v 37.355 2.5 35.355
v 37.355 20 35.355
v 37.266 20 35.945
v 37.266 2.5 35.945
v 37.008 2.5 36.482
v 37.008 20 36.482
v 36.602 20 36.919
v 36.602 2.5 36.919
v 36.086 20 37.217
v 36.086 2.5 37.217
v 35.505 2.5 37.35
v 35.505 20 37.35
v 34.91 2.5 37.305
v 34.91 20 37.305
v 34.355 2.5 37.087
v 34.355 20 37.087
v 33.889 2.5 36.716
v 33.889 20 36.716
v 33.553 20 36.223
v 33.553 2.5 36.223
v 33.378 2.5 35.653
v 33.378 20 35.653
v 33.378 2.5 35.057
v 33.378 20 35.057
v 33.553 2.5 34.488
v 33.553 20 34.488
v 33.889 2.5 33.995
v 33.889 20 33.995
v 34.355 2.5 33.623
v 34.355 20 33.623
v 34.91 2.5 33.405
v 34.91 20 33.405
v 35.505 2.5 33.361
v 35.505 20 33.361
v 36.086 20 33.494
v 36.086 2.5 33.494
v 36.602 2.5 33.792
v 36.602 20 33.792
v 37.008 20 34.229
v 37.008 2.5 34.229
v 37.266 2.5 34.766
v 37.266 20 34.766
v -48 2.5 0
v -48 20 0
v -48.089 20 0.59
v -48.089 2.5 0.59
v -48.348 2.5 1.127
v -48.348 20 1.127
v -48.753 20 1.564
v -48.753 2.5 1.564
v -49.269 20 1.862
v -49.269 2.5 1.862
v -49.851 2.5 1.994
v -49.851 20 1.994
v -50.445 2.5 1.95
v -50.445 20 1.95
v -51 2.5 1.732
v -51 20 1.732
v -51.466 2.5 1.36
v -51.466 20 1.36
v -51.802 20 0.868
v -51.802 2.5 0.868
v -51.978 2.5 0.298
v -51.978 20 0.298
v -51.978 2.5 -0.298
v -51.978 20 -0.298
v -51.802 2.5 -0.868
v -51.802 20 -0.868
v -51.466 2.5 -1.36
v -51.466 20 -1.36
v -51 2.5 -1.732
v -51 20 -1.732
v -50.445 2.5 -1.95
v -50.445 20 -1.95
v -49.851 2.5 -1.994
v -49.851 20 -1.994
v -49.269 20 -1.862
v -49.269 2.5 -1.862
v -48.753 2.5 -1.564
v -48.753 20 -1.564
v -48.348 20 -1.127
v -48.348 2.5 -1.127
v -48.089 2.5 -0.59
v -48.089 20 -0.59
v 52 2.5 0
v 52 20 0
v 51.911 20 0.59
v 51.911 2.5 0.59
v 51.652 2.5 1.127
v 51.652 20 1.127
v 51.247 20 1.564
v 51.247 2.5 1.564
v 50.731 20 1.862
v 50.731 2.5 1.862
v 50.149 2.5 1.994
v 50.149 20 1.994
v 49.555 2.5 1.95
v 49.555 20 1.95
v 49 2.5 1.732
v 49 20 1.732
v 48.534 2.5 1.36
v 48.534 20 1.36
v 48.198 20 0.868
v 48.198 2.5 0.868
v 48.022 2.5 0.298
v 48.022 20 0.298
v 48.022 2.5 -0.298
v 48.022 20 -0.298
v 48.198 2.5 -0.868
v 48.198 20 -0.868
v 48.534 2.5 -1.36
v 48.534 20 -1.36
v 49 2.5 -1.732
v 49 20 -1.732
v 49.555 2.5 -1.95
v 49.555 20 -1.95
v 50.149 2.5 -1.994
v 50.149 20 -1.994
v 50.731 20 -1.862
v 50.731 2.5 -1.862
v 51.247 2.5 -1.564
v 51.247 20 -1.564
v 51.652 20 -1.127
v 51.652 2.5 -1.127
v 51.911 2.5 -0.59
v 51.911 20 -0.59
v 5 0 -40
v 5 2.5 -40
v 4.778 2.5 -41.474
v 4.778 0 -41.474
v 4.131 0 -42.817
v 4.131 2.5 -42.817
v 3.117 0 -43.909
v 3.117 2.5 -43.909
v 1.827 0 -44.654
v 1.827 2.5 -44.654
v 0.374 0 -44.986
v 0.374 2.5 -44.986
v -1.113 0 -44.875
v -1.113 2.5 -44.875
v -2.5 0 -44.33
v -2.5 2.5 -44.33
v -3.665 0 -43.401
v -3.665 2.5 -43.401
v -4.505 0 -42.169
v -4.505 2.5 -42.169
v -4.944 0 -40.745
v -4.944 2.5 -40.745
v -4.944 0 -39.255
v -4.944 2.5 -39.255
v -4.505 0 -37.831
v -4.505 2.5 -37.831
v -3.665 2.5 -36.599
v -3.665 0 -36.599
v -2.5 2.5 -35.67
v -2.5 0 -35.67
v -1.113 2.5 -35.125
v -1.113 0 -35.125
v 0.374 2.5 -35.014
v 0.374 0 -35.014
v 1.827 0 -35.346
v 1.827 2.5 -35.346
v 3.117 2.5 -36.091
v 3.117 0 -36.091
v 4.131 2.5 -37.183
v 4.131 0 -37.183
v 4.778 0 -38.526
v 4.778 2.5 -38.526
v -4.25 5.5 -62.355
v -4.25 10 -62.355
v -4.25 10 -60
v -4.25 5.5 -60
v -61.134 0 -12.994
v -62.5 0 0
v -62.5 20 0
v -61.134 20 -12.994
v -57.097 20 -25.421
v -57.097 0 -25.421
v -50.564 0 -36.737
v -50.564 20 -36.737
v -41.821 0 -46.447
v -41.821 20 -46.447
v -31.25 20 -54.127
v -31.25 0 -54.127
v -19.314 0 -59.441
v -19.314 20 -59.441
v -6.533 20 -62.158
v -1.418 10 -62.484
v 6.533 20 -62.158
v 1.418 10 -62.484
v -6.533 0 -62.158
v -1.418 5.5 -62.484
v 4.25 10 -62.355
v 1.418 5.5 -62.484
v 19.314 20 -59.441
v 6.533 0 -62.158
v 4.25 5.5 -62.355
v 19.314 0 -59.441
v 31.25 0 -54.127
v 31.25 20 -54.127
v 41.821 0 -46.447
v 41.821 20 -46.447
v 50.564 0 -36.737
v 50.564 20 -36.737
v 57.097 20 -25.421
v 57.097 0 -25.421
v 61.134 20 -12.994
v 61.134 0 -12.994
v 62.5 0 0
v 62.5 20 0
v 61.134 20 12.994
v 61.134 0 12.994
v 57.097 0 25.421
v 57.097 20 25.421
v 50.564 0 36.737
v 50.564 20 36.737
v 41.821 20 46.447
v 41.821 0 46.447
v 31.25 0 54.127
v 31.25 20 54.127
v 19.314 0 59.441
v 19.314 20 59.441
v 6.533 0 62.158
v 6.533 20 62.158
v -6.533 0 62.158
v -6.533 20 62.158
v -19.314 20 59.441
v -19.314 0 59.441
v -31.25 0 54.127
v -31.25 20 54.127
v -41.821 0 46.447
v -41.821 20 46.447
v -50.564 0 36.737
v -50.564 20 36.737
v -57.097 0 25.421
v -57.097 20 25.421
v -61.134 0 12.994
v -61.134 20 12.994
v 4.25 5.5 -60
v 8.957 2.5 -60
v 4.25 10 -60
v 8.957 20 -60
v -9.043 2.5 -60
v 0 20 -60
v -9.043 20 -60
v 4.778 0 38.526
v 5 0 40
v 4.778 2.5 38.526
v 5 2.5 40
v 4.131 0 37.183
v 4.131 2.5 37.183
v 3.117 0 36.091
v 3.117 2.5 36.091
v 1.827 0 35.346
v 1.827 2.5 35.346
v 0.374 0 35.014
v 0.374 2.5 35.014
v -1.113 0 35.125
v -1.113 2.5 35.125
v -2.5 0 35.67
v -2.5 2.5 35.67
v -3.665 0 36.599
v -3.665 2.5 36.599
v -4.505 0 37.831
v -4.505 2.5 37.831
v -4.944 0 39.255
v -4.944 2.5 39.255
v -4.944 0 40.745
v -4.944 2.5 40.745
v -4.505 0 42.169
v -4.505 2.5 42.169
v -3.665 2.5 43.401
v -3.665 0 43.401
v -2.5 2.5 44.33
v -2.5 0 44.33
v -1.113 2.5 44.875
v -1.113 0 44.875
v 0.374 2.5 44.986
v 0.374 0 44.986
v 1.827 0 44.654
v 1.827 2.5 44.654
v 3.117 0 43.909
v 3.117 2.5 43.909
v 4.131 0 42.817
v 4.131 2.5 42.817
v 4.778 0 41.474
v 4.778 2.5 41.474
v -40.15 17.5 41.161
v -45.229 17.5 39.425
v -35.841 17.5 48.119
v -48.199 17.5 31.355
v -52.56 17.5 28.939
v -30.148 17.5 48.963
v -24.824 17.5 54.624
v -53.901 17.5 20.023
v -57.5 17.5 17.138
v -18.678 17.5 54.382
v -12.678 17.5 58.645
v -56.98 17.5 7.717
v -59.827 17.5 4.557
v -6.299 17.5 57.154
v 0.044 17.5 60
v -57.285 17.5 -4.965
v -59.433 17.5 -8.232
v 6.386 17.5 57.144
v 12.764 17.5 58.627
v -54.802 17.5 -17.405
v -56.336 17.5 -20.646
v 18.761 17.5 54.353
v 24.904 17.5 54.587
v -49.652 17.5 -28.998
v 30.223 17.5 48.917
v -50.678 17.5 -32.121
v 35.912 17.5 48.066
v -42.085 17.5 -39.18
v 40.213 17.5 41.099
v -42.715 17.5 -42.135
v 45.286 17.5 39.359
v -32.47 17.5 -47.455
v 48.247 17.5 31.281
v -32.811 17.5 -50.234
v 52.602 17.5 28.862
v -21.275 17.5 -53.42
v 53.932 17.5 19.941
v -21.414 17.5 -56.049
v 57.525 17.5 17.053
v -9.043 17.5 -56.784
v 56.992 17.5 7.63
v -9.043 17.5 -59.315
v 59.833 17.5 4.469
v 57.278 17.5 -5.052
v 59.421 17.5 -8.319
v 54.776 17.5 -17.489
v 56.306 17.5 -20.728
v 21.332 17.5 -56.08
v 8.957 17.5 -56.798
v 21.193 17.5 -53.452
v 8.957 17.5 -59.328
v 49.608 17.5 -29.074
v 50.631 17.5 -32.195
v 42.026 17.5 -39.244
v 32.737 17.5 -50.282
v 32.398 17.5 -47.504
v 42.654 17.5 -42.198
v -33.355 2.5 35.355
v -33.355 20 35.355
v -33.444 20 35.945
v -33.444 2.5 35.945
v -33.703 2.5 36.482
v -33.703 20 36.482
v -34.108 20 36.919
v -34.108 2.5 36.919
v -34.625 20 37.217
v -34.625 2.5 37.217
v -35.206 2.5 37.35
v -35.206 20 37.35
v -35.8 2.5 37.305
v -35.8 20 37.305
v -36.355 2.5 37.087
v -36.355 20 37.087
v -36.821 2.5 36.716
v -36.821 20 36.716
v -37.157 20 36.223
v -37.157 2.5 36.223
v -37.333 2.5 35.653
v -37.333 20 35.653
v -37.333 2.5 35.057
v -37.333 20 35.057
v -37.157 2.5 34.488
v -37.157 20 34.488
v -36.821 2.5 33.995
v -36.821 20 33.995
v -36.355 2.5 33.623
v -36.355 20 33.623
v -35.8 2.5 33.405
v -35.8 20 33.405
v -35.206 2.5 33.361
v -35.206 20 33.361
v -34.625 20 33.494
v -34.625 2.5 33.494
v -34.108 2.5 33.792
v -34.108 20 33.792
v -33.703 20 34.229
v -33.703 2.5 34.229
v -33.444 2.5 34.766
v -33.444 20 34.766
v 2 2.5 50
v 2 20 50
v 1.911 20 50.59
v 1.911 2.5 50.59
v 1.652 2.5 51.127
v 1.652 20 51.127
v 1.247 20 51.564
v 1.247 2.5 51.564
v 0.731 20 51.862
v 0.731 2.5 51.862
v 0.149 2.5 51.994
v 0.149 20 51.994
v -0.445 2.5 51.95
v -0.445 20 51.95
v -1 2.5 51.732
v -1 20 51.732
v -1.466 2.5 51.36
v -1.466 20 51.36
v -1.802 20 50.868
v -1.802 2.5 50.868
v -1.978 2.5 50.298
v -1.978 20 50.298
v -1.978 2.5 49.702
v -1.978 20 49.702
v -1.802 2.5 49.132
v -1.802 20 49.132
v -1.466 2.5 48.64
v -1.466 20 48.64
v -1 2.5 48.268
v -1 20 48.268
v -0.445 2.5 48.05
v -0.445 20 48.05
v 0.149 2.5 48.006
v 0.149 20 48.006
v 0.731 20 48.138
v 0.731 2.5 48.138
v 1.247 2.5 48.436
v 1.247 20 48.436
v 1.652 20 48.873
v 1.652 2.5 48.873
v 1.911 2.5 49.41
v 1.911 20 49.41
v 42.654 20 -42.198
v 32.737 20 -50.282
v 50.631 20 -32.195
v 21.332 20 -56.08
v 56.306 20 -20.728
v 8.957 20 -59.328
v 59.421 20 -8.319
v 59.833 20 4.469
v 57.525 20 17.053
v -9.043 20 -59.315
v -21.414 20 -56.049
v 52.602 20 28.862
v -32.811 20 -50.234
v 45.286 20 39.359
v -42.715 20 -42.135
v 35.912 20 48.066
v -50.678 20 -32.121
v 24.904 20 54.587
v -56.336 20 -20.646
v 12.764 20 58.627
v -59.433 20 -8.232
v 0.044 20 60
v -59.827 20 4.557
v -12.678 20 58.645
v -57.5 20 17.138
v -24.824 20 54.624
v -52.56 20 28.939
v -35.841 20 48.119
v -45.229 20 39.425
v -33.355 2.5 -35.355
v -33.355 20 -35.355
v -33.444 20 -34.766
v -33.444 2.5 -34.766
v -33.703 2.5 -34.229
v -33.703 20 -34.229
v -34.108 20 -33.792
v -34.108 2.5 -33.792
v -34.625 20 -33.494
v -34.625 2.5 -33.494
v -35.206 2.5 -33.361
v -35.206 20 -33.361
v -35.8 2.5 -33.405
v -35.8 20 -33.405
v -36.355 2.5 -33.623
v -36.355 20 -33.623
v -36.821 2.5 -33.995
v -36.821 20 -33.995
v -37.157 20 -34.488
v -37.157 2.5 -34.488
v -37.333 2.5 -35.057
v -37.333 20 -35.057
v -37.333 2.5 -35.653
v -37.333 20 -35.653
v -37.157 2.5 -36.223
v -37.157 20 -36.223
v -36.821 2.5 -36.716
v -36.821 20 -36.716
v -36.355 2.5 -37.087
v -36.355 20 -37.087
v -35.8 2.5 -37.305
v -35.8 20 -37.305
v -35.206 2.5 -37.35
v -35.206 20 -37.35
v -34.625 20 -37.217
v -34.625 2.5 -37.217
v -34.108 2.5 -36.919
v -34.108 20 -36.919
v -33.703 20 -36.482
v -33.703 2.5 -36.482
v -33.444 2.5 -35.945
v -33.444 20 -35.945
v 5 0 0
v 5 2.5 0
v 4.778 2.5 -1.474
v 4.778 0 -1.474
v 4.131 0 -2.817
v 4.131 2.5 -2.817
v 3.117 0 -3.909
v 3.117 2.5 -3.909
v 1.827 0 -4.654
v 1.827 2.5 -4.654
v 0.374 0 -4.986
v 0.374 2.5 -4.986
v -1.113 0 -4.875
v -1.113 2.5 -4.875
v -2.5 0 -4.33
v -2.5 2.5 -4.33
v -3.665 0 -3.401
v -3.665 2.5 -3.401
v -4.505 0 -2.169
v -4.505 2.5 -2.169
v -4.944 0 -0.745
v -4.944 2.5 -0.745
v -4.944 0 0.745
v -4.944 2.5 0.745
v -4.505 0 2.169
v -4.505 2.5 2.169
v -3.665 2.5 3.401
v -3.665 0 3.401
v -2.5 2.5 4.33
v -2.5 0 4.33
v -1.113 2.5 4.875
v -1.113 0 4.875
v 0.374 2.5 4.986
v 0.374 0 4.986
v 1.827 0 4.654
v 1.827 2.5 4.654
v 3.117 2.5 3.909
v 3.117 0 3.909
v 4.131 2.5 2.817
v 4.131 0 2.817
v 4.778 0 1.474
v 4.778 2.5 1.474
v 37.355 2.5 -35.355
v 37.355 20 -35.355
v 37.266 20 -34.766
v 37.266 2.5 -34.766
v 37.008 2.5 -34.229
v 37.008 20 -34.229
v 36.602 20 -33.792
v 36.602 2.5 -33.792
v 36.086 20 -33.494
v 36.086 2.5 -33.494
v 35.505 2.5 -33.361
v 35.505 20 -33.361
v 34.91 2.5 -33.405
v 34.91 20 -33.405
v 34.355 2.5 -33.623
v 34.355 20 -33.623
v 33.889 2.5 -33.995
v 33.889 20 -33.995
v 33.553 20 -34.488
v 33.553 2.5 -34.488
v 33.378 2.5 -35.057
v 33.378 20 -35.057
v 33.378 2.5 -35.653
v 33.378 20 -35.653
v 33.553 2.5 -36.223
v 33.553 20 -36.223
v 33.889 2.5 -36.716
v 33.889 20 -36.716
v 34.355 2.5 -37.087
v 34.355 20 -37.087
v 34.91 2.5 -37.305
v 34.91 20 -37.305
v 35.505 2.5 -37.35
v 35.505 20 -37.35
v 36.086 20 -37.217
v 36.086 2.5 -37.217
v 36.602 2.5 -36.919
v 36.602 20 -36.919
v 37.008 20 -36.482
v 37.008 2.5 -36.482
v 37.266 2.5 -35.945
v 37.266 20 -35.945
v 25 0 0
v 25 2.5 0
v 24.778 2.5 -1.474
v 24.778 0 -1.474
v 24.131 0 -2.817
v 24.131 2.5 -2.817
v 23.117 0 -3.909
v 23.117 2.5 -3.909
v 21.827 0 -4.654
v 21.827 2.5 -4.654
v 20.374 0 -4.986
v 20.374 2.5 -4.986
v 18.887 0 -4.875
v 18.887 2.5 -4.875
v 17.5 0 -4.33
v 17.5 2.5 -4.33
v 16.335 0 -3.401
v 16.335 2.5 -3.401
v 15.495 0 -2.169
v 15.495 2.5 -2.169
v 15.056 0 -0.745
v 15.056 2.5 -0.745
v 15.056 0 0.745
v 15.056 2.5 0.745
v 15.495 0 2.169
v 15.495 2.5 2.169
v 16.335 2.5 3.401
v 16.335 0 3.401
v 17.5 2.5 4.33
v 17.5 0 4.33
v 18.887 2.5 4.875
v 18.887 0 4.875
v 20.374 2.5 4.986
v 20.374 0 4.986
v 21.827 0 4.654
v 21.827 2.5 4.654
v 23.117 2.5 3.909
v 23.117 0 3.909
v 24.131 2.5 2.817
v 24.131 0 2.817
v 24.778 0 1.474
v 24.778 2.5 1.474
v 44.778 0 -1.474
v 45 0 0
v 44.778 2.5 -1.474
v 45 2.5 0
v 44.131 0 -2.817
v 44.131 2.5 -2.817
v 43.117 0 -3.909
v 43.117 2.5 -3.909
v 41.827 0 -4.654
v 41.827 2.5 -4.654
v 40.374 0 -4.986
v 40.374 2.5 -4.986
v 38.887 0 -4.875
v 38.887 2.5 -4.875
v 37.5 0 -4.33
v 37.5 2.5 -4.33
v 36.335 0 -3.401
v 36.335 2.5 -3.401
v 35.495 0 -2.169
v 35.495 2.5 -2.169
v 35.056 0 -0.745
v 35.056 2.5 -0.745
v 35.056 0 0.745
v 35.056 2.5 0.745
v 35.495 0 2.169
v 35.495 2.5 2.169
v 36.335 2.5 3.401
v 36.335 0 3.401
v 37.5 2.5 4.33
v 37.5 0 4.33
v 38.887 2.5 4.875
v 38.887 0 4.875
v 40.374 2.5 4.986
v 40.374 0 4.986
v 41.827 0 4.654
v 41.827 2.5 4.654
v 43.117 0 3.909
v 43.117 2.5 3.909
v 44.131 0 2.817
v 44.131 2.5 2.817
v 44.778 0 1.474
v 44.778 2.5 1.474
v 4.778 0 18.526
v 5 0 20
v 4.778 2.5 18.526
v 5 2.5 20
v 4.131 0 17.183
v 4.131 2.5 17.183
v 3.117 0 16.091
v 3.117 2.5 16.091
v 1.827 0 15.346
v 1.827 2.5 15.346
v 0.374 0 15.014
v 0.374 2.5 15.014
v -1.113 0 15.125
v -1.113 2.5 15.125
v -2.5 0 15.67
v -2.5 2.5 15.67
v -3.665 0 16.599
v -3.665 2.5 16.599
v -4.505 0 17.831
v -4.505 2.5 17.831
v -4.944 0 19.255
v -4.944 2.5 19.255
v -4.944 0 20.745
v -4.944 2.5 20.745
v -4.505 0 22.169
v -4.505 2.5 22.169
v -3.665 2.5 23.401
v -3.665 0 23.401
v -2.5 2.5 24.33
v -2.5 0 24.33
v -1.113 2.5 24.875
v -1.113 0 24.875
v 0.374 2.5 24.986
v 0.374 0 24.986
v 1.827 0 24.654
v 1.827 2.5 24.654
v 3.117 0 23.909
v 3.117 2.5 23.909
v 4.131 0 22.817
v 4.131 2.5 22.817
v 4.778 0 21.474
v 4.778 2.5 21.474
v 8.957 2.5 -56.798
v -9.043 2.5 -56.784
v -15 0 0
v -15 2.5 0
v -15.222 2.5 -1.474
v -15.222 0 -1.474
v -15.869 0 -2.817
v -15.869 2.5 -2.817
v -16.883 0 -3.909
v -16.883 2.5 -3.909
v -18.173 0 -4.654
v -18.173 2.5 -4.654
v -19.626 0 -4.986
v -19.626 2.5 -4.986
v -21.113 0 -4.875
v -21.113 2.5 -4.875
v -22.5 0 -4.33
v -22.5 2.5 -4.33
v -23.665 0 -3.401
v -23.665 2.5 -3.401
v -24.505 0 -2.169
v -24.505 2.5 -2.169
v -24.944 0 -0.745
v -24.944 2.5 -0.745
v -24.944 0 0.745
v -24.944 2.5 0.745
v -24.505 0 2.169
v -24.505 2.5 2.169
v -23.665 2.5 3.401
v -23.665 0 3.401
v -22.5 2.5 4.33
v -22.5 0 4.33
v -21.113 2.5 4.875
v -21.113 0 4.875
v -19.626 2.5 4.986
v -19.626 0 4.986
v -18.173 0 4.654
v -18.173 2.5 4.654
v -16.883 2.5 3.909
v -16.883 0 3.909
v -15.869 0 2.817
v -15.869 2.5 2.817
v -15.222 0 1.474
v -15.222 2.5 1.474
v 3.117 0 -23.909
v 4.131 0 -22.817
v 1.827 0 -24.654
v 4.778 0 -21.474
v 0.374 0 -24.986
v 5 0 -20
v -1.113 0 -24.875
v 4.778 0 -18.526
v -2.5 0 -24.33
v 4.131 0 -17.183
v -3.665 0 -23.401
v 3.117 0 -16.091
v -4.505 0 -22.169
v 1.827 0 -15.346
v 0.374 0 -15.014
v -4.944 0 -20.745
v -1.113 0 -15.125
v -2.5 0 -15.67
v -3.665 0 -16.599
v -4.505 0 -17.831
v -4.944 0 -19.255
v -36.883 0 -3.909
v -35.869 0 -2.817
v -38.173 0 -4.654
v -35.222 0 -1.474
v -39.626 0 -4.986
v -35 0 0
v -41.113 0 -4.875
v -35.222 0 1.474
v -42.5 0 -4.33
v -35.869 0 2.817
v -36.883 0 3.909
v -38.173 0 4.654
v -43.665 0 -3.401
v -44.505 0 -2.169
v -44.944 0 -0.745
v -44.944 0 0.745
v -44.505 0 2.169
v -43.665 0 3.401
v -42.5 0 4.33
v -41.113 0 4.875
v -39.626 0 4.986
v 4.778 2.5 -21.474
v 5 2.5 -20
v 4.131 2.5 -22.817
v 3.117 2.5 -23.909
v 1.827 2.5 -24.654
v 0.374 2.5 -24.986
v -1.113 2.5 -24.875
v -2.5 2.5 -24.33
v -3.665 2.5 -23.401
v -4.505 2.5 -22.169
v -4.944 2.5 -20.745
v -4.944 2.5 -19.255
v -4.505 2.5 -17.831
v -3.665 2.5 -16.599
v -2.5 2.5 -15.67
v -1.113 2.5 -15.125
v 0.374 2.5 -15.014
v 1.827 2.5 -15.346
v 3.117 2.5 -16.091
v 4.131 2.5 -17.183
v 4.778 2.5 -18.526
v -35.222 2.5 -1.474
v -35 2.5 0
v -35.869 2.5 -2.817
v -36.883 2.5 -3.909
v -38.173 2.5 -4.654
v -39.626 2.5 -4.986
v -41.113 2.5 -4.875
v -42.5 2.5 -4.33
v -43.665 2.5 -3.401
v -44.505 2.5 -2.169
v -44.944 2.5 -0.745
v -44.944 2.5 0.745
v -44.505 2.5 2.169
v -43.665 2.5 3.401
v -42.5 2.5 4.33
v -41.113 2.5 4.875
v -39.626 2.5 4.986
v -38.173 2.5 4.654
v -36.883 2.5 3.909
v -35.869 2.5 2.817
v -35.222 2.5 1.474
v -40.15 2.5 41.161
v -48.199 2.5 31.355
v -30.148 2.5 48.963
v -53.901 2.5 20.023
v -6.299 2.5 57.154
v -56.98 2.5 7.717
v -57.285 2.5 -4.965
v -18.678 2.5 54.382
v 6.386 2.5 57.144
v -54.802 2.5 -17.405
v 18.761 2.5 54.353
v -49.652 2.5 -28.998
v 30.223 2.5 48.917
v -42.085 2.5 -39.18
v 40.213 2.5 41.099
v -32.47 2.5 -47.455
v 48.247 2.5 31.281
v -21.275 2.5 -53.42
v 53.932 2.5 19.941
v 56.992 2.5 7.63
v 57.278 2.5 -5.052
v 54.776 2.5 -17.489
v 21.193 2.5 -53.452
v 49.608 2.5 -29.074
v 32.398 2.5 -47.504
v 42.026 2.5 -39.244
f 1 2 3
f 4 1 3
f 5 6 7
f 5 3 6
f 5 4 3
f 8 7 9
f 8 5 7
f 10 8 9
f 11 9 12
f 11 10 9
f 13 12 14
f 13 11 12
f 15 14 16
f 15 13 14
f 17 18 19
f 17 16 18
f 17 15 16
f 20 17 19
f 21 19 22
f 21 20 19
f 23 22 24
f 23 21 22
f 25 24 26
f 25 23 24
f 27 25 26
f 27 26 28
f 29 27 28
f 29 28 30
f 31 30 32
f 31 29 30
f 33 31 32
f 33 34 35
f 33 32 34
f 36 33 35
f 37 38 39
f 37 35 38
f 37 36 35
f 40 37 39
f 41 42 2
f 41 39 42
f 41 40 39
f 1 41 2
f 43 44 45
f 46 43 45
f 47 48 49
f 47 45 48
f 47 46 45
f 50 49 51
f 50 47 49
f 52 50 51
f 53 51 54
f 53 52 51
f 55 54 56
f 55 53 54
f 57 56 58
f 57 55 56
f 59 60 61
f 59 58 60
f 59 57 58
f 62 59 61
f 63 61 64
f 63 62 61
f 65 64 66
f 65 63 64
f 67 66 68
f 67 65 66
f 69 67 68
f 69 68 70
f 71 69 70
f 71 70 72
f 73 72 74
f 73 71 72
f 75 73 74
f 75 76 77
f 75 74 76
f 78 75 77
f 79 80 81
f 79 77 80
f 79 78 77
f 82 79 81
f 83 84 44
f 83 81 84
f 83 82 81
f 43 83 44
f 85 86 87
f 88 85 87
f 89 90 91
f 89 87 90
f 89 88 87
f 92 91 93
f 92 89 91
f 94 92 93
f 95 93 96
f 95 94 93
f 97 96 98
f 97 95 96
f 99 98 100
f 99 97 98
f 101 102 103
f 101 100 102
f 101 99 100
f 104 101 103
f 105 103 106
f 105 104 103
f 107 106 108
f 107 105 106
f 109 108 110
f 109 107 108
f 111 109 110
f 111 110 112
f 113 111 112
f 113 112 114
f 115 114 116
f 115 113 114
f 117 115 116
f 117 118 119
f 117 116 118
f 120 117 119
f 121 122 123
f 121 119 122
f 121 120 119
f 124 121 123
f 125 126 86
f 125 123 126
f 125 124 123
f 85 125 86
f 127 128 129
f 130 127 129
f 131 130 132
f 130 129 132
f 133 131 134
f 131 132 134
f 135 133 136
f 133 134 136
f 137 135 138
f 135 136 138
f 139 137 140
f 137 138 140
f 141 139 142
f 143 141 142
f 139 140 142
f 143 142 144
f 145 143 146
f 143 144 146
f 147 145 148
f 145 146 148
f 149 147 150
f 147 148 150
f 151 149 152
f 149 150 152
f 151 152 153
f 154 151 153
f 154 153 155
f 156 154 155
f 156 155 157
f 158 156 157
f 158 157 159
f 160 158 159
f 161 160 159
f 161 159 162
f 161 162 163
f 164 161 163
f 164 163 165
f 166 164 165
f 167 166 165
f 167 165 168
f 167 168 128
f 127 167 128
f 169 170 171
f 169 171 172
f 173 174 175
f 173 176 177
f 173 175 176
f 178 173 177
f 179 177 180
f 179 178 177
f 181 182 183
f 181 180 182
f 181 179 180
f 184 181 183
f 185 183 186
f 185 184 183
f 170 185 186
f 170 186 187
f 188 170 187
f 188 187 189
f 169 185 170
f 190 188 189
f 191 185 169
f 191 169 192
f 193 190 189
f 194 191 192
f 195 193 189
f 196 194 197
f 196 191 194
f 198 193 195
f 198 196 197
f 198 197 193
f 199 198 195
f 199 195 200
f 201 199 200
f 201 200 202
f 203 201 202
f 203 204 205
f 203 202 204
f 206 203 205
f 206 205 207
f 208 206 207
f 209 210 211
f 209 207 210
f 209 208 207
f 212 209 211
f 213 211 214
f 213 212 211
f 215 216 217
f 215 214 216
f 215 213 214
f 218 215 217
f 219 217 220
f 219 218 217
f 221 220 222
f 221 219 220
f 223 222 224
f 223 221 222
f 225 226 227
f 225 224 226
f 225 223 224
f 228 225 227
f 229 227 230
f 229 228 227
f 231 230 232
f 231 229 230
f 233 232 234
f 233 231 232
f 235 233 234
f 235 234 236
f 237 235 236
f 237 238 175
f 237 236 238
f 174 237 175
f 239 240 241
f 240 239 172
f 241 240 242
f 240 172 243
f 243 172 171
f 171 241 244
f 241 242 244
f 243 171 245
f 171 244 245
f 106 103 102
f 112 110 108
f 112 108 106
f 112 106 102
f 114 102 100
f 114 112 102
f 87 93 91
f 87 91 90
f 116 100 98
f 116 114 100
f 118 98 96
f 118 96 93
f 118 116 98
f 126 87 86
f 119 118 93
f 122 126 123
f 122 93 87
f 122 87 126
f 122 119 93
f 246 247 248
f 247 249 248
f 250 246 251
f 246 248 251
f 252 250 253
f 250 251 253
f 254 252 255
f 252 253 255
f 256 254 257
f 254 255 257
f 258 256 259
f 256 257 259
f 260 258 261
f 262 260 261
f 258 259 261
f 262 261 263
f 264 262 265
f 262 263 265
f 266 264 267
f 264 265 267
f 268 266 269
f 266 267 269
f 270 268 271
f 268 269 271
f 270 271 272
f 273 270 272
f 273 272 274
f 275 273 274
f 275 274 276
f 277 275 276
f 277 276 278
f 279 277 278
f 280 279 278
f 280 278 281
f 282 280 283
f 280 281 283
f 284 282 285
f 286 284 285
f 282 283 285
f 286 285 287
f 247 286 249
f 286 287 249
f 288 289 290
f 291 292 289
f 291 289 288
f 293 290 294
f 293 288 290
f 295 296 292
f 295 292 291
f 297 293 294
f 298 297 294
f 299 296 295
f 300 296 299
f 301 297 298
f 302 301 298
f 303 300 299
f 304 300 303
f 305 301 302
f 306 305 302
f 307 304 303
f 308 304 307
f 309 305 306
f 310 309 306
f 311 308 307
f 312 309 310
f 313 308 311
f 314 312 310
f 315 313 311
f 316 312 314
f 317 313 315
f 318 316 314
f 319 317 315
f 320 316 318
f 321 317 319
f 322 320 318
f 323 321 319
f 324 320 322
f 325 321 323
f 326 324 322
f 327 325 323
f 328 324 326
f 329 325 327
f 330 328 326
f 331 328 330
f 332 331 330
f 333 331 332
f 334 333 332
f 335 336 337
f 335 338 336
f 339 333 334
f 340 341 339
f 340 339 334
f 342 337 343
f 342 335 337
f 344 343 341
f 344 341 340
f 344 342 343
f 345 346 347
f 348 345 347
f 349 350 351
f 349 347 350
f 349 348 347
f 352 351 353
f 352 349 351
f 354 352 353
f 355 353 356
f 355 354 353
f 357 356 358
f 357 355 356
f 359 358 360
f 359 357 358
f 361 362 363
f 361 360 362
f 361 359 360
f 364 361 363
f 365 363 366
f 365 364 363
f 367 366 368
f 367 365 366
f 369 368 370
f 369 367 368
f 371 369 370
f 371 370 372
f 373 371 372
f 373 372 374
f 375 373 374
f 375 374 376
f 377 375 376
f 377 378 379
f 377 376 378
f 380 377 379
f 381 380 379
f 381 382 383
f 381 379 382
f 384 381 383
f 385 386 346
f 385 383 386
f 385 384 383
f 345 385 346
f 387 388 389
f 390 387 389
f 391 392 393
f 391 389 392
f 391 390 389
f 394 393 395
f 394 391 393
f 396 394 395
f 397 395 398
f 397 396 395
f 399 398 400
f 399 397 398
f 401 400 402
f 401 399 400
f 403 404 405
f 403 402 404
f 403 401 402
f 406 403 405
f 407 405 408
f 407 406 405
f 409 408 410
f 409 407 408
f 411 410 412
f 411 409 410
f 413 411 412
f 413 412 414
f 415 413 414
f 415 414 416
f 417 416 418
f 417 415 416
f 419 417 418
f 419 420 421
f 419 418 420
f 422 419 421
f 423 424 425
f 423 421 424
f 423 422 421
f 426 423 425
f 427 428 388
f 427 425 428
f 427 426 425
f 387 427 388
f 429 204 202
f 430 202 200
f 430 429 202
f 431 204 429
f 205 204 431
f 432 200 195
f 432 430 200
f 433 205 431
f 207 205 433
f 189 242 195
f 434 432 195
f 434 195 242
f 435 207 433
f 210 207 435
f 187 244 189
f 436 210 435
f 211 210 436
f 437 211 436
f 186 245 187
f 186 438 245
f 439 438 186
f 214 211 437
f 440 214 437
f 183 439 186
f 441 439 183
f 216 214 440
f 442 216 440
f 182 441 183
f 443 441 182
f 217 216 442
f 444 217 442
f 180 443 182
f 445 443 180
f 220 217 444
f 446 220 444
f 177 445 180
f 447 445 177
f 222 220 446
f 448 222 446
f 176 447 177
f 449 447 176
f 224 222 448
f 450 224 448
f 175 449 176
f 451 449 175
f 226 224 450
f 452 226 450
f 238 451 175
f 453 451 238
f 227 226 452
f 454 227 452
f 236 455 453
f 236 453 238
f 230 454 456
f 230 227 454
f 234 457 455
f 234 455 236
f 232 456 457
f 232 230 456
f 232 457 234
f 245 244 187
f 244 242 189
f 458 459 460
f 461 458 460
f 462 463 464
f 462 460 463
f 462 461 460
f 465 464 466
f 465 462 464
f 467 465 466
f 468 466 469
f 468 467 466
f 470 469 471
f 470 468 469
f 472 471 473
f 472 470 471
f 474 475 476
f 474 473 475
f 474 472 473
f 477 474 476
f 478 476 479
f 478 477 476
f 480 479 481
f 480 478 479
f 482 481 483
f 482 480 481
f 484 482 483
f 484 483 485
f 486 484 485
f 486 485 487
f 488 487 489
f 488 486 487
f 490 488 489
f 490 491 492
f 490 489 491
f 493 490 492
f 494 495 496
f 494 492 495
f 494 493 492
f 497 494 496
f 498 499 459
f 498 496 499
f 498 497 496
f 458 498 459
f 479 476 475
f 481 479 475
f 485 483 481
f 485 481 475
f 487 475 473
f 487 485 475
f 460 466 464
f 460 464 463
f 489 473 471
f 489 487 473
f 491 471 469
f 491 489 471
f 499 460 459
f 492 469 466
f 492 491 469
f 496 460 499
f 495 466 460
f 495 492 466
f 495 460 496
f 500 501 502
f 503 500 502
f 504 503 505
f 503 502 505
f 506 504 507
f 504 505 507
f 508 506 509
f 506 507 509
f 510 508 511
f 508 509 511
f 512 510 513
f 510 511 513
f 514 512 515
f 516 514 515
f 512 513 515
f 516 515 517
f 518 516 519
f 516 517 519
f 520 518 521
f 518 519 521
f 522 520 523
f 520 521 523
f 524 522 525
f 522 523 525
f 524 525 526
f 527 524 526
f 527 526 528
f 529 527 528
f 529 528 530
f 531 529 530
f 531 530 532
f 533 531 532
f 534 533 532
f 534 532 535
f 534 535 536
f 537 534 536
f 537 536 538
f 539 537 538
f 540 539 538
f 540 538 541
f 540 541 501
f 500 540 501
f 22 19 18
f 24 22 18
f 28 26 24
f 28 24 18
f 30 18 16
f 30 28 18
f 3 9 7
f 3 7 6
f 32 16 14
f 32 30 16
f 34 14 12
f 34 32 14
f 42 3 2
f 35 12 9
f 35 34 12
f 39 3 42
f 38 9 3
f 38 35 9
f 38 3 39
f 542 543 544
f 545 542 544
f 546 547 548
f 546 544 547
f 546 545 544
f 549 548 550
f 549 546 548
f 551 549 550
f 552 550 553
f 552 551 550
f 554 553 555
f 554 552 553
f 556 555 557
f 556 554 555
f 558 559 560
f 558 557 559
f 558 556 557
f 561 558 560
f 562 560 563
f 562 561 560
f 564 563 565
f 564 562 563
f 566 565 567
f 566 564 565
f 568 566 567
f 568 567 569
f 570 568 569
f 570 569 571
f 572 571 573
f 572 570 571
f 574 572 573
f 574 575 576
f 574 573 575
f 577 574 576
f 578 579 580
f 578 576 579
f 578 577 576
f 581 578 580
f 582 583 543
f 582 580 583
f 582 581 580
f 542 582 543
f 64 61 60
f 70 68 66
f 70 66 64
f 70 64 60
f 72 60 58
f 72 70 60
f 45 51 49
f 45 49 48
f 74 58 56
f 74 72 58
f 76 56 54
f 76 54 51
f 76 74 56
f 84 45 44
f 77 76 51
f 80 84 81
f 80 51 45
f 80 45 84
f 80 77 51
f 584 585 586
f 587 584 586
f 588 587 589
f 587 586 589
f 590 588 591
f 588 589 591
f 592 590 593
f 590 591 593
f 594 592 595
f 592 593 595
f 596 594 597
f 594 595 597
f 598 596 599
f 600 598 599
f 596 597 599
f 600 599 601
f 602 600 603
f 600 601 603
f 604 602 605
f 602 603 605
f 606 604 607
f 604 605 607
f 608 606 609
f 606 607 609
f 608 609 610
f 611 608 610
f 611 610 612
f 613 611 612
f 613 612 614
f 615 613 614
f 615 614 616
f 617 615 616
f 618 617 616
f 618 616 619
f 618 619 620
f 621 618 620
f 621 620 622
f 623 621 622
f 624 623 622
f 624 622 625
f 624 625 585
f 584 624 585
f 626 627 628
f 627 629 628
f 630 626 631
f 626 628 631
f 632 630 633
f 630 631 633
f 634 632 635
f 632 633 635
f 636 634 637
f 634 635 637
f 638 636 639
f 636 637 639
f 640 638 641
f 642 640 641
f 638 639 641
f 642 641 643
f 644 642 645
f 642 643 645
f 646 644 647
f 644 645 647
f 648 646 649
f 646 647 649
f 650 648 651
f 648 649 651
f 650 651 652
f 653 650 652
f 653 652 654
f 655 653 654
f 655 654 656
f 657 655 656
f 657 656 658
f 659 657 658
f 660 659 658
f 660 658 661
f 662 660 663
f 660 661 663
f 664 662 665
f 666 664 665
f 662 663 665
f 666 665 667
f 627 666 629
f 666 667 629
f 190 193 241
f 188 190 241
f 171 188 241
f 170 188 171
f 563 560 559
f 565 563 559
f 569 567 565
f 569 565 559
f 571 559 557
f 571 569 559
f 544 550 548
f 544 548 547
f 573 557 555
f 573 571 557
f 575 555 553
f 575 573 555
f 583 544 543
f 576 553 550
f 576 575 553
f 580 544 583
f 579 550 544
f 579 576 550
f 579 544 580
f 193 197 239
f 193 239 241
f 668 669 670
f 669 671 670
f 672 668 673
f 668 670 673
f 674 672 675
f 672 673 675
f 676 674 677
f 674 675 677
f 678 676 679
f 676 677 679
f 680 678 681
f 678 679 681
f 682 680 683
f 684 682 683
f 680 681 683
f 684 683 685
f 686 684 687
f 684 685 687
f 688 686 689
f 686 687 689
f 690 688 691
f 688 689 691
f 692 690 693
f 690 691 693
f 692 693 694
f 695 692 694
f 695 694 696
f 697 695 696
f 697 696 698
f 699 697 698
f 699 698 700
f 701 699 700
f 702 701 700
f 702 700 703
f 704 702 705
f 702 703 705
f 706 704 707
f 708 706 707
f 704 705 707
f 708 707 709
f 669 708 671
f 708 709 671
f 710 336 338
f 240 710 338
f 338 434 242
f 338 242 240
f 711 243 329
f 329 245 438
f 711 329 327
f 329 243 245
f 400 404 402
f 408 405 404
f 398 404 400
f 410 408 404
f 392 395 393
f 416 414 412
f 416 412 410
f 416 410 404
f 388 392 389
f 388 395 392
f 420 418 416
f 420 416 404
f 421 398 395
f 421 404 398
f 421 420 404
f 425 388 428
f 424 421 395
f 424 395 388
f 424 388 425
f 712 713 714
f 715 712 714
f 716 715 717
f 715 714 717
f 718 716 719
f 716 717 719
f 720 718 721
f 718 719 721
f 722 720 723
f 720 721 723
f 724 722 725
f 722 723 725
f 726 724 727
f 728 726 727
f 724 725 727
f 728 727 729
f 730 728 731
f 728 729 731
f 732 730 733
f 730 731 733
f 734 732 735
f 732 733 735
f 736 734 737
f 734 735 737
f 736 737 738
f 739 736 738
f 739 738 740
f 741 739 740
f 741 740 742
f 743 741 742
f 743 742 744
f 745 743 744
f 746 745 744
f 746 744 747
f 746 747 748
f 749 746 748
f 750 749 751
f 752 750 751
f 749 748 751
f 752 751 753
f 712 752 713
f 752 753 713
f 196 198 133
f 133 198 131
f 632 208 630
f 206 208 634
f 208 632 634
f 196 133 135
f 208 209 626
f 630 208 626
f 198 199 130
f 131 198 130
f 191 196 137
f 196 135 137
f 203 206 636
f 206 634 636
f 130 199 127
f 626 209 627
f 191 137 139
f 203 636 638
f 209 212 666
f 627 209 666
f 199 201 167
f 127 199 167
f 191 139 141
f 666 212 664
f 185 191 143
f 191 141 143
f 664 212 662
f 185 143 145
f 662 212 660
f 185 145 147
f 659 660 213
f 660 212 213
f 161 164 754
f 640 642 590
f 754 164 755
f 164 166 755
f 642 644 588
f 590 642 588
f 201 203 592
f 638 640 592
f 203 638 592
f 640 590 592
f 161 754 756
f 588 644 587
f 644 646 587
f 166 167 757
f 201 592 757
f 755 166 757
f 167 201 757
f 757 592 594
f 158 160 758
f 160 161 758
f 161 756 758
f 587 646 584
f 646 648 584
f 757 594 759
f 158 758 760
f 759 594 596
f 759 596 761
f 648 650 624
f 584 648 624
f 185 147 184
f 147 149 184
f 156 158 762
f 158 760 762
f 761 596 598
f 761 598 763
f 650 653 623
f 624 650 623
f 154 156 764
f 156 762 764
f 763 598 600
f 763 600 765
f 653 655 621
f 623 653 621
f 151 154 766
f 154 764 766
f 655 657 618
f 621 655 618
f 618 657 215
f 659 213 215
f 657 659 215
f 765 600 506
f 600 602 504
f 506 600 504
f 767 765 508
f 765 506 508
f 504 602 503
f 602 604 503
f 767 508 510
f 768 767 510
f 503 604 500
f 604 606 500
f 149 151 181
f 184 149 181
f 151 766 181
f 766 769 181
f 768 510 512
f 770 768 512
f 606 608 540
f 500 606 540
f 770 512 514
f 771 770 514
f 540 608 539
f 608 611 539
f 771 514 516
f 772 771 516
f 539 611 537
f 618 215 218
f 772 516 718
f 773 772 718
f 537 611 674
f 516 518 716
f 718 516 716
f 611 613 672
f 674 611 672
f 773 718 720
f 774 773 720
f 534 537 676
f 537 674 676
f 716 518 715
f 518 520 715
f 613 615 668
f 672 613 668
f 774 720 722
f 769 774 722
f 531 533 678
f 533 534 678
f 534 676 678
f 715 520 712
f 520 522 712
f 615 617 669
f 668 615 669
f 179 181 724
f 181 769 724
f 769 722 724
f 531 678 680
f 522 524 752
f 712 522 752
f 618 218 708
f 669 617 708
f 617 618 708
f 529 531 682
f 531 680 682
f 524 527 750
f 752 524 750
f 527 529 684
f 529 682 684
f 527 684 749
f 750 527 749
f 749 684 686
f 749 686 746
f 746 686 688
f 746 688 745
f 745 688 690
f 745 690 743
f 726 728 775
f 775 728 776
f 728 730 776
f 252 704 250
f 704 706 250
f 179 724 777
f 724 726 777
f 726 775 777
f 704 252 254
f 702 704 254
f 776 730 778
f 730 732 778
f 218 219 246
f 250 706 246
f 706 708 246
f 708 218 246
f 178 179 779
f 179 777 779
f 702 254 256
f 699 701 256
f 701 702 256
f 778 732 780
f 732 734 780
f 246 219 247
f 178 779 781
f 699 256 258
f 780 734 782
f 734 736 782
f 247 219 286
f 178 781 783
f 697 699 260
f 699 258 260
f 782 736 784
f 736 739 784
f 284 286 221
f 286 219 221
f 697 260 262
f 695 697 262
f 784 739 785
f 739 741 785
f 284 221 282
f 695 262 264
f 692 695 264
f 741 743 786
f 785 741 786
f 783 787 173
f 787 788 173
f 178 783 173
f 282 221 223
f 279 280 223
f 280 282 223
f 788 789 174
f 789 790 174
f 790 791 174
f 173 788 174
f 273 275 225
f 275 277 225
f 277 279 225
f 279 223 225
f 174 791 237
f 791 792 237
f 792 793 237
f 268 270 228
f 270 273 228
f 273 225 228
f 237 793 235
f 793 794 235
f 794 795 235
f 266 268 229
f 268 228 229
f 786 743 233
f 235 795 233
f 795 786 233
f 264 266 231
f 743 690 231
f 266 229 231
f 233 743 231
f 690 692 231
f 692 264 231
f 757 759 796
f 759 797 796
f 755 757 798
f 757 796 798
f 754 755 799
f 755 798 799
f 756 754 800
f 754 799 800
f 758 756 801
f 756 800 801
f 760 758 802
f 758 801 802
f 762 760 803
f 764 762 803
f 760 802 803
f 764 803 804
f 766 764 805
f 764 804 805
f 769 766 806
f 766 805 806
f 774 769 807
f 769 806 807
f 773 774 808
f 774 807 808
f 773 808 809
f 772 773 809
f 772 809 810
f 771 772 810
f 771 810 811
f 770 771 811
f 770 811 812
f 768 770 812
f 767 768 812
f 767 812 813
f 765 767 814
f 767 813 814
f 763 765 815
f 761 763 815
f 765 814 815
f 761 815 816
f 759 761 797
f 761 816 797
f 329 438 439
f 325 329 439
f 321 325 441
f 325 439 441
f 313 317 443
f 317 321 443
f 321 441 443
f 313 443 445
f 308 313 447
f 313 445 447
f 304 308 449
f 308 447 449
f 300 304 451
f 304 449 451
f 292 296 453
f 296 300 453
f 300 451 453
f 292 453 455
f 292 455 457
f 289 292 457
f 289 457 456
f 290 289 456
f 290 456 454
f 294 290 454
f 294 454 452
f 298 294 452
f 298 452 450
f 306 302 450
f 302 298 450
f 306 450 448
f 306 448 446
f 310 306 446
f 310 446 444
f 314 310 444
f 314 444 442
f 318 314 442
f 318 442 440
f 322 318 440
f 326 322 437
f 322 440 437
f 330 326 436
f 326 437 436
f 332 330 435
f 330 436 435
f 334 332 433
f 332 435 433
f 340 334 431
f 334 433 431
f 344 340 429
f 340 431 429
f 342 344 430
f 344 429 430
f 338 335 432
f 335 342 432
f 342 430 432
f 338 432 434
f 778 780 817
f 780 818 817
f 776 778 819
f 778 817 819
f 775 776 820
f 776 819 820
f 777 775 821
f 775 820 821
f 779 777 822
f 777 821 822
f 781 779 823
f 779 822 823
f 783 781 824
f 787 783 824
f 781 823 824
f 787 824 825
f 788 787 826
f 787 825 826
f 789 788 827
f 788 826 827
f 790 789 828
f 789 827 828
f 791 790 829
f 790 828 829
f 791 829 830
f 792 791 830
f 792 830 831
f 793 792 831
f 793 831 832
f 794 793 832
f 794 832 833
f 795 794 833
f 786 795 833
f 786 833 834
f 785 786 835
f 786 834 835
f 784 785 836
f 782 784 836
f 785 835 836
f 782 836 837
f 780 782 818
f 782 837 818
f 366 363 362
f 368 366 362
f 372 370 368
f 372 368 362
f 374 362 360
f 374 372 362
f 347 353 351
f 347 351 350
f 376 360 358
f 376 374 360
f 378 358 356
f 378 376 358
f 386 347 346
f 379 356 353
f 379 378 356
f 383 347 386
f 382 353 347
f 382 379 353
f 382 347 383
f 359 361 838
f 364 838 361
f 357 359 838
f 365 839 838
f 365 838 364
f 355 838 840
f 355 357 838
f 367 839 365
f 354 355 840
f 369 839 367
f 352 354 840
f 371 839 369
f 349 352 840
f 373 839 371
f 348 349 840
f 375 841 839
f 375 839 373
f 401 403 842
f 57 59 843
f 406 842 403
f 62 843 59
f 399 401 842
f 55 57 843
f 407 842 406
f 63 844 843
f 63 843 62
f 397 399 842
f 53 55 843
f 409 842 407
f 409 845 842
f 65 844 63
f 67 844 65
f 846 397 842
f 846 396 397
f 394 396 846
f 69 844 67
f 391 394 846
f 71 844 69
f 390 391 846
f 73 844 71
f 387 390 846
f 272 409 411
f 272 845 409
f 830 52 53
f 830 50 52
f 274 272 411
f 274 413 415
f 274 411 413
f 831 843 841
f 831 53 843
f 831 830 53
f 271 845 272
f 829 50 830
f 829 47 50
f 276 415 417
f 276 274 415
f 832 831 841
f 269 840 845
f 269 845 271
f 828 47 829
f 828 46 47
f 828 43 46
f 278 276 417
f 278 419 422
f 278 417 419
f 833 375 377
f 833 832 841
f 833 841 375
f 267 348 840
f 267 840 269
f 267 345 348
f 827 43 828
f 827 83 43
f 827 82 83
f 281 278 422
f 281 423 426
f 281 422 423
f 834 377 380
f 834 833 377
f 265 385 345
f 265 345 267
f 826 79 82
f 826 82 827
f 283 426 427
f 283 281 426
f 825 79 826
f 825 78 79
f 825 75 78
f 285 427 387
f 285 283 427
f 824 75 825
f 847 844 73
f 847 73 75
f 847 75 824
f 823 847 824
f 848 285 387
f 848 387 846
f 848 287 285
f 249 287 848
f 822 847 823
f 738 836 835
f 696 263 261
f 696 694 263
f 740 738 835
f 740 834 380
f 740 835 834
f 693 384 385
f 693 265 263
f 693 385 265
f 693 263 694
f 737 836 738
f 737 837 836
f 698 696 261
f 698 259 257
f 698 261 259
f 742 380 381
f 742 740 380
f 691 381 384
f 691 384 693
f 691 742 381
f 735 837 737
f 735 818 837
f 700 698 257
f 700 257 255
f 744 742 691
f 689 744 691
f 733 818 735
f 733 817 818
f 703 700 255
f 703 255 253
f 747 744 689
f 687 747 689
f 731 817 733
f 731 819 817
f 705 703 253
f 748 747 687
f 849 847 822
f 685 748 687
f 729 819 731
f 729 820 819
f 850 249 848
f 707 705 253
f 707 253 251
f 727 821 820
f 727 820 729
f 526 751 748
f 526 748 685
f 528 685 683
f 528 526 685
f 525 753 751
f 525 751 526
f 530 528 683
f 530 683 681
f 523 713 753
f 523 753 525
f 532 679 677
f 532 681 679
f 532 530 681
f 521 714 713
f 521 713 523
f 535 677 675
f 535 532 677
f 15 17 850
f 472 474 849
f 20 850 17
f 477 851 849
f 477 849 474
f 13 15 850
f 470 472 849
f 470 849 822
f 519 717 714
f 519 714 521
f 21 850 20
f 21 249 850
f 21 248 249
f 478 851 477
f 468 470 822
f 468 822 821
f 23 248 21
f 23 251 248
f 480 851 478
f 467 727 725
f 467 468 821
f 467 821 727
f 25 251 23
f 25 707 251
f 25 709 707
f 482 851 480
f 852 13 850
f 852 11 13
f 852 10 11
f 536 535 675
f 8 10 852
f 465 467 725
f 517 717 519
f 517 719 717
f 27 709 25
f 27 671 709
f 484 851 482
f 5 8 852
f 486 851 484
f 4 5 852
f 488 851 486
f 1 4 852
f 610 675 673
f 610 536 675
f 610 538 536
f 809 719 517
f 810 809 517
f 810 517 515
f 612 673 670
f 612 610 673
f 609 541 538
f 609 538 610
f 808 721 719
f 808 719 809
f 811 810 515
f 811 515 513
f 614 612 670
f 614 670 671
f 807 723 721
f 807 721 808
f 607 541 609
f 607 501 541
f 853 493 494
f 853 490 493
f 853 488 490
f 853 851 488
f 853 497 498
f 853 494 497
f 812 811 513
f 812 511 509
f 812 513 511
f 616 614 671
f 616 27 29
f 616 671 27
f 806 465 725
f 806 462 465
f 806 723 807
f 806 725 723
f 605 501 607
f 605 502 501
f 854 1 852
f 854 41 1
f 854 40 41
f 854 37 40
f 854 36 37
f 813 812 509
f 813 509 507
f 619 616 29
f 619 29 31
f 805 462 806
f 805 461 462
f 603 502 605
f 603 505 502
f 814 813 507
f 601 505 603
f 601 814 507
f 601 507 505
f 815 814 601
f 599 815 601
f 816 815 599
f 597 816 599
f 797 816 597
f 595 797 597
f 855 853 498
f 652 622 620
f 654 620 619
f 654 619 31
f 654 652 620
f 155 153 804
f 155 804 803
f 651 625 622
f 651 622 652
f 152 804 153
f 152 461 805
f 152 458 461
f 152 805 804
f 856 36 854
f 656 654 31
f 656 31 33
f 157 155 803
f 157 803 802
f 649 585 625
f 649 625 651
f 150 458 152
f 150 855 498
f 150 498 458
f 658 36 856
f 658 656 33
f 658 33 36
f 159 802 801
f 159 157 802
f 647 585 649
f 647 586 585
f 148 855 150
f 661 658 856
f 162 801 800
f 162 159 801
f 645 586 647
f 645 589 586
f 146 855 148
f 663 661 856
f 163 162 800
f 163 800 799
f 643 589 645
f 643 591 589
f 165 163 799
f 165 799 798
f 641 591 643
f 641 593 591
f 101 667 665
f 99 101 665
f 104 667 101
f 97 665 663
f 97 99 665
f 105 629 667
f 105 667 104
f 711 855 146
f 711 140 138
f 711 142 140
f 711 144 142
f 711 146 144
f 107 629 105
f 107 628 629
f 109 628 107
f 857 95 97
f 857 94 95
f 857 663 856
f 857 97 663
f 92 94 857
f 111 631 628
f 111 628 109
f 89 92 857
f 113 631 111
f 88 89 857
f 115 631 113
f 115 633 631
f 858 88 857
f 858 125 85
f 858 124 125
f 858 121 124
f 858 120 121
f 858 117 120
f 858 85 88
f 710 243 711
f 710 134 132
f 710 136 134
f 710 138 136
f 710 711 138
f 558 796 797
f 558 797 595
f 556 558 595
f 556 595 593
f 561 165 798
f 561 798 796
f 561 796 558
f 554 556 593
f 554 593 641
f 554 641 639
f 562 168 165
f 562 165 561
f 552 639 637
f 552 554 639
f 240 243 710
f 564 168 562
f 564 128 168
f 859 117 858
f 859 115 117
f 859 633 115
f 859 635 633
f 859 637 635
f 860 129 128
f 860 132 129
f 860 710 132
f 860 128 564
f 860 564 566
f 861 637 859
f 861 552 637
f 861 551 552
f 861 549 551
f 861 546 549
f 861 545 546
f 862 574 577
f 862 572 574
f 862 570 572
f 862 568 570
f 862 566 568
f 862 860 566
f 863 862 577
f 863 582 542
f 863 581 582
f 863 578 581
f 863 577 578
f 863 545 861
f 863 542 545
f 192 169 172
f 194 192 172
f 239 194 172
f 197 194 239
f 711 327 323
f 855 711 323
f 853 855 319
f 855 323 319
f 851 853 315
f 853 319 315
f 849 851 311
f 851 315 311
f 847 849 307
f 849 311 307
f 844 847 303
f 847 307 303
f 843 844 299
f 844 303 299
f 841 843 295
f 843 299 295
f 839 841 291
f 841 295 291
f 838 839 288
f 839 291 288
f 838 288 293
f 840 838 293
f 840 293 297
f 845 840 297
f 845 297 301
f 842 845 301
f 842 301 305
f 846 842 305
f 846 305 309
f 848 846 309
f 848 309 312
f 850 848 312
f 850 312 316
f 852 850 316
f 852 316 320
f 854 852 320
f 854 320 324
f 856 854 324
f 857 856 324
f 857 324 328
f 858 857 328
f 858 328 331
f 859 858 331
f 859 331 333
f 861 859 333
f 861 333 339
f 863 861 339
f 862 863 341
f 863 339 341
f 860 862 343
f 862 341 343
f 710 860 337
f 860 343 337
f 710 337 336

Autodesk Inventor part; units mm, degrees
ref_plane "YZ Plane" through (0, 0, 0) normal (1, 0, 0) x (0, 1, 0)
ref_plane "XZ Plane" through (0, 0, 0) normal (0, 1, 0) x (-1, 0, 0)
sketch "Sketch1" plane through (0, 0, 0) normal (0, 1, 0) x (-1, 0, 0)
  circle A0 centre (0, 0) radius 62.5
  dimension "d0" = 125
extrude "Extrusion1" add sketch "Sketch1" along normal blind 20
sketch "Sketch2" plane through (0, 20, 0) normal (0, 1, 0) x (1, 0, 0)
  circle A0 centre (0, 0) radius 60
  dimension "d3" = 120
extrude "Extrusion2" cut sketch "Sketch2" against normal blind 2.5
sketch "Sketch3" plane through (0, 17.5, 0) normal (0, 1, 0) x (1, 0, 0)
  circle A0 centre (0, 0) radius 57.5
  dimension "d6" = 115
extrude "Extrusion3" cut sketch "Sketch3" against normal blind 15
sketch "Sketch4" plane through (0, 2.5, 0) normal (0, 1, 0) x (1, 0, 0)
  circle A0 centre (0, 0) radius 5
  circle A1 centre (0, 20) radius 5
  circle A2 centre (0, 40) radius 5
  circle A3 centre (20, 0) radius 5
  circle A4 centre (40, 0) radius 5
  circle A5 centre (0, -40) radius 5
  circle A6 centre (0, -20) radius 5
  circle A7 centre (-20, 0) radius 5
  circle A8 centre (-40, 0) radius 5
  dimension "d9" = 10
  dimension "d10" = 10
  dimension "d11" = 10
  dimension "d12" = 10
  dimension "d13" = 10
  dimension "d14" = 10
  dimension "d15" = 10
  dimension "d16" = 10
  dimension "d17" = 10
  dimension "d18" = 20
  dimension "d19" = 20
  dimension "d20" = 20
  dimension "d21" = 20
  dimension "d22" = 20
  dimension "d23" = 20
  dimension "d24" = 20
  dimension "d25" = 20
extrude "Extrusion4" cut sketch "Sketch4" against normal up to next
ref_plane "Work Plane1" through (0, 0, -62.5) normal (0, 0, 1) x (1, 0, 0)
sketch "Sketch5" plane through (0, 0, -62.5) normal (0, 0, 1) x (1, 0, 0)
  line L0 (62.5, 20) -> (-62.5, 20) construction
  line L1 (-62.5, 0) -> (62.5, 0) construction
  line L2 (4.25, 10) -> (-4.25, 10)
  line L3 (-4.25, 10) -> (-4.25, 5.5)
  line L4 (-4.25, 5.5) -> (4.25, 5.5)
  line L5 (4.25, 5.5) -> (4.25, 10)
  line L6 (-57.5, 2.5) -> (57.5, 2.5) construction
  line L7 (0, 0) -> (0, 20) construction
  point P0 (0, 5.5)
  dimension "d28" = 8.5
  dimension "d29" = 4.5
  dimension "d61" = 3
extrude "Extrusion5" cut sketch "Sketch5" along normal blind 17.5
sketch "Sketch6" plane through (0, 2.5, 0) normal (0, 1, 0) x (1, 0, 0)
  line L0 (0, 0) -> (50, 0) construction
  circle A0 centre (0, 0) radius 5 construction
  line L1 (0, 0) -> (35.3553, -35.3553) construction
  line L2 (0, 0) -> (50, 0) construction
  line L3 (0, 0) -> (0, -50) construction
  line L4 (0, 0) -> (35.3553, 35.3553) construction
  line L5 (0, 0) -> (50, 0) construction
  line L6 (0, 0) -> (0, 50) construction
  line L7 (0, 0) -> (-35.3553, 35.3553) construction
  line L8 (0, 0) -> (50, 0) construction
  line L9 (0, 0) -> (-50, 0) construction
  line L10 (0, 0) -> (50, 0) construction
  line L11 (0, 0) -> (-35.3553, -35.3553) construction
  line L12 (0, 0) -> (50, 0) construction
  circle A1 centre (-35.3553, 35.3553) radius 2
  circle A2 centre (0, 50) radius 2
  circle A3 centre (35.3553, 35.3553) radius 2
  circle A4 centre (50, 0) radius 2
  circle A5 centre (35.3553, -35.3553) radius 2
  circle A6 centre (0, -50) radius 2
  circle A7 centre (-35.3553, -35.3553) radius 2
  circle A8 centre (-50, 0) radius 2
  dimension "d32" = 50
  dimension "d33" = 50
  dimension "d34" = 45
  dimension "d35" = 50
  dimension "d36" = 50
  dimension "d37" = 45
  dimension "d38" = 50
  dimension "d39" = 50
  dimension "d40" = 135
  dimension "d41" = 50
  dimension "d42" = 180
  dimension "d43" = 50
  dimension "d44" = 135
  dimension "d45" = 4
  dimension "d46" = 4
  dimension "d47" = 4
  dimension "d48" = 4
  dimension "d49" = 4
  dimension "d50" = 4
  dimension "d51" = 4
  dimension "d52" = 4
extrude "Extrusion6" add sketch "Sketch6" along normal blind 17.5 contours A1 | A3 | A4 | A5 | A6 | A7 | A8
sketch "Sketch7" plane through (0, 20, 0) normal (0, 1, 0) x (1, 0, 0)
  circle A0 centre (-35.3553, -35.3553) radius 2 projected
  circle A1 centre (35.3553, -35.3553) radius 2 projected
  circle A2 centre (35.3553, 35.3553) radius 2 projected
  circle A3 centre (-35.3553, 35.3553) radius 2 projected
  circle A4 centre (50, 0) radius 2 projected
  circle A5 centre (0, -50) radius 2 projected
  circle A6 centre (-50, 0) radius 2 projected
  circle A7 centre (0, 0) radius 57.5 projected
  circle A8 centre (0, 40) radius 5 projected
  circle A9 centre (-20, 0) radius 5 projected
  circle A10 centre (0, -40) radius 5 projected
  circle A11 centre (20, 0) radius 5 projected
  circle A12 centre (0, 20) radius 5 projected
  circle A13 centre (0, 0) radius 5 projected
  circle A14 centre (40, 0) radius 5 projected
  circle A15 centre (0, -20) radius 5 projected
  circle A16 centre (-40, 0) radius 5 projected
  circle A17 centre (0, 0) radius 62.5 projected
  line L0 (8.9566, 60) -> (-9.0434, 60)
  line L1 (-9.0434, 60) -> (-9.0434, 17)
  line L2 (-9.0434, 17) -> (8.9566, 17)
  line L3 (8.9566, 17) -> (8.9566, 60)
  line L4 (0, 0) -> (-0.0452, 62.5) construction
  arc A18 (4.25, 62.3553) -> (-4.25, 62.3553) centre (0, 0) ccw construction
  point P0 (-0.0434, 60)
  dimension "d56" = 18
  dimension "d57" = 43
  dimension "d58" = 2.5
extrude "Extrusion7" cut sketch "Sketch7" against normal up to surface (17.5 mm away) contours L3 L2 A12 L1 A7 | A7 L1 L0 L3 | L2 A12 picked at (-7.6956, 37.9281) picked at (-1.3474, 18.3627)
equation "\"d7\" = d1 - 2 * d4"
equation "\"d10\" = d9"
equation "\"d11\" = d9"
equation "\"d12\" = d9"
equation "\"d13\" = d9"
equation "\"d14\" = d9"
equation "\"d15\" = d9"
equation "\"d16\" = d9"
equation "\"d17\" = d9"
equation "\"d19\" = d18"
equation "\"d20\" = d18"
equation "\"d21\" = d18"
equation "\"d22\" = d18"
equation "\"d23\" = d18"
equation "\"d24\" = d18"
equation "\"d25\" = d18"
equation "\"d33\" = d32"
equation "\"d36\" = d32"
equation "\"d38\" = d32"
equation "\"d39\" = d32"
equation "\"d41\" = d32"
equation "\"d43\" = d32"
equation "\"d46\" = d47"
equation "\"d47\" = d45"
equation "\"d48\" = d45"
equation "\"d49\" = d45"
equation "\"d50\" = d45"
equation "\"d51\" = d45"
equation "\"d52\" = d45"
equation "\"d53\" = d1 - d4"
equation "\"d1\" = 20"
equation "\"d4\" = 2.5"
properties part number "base bund" material "ABS Plastic"
